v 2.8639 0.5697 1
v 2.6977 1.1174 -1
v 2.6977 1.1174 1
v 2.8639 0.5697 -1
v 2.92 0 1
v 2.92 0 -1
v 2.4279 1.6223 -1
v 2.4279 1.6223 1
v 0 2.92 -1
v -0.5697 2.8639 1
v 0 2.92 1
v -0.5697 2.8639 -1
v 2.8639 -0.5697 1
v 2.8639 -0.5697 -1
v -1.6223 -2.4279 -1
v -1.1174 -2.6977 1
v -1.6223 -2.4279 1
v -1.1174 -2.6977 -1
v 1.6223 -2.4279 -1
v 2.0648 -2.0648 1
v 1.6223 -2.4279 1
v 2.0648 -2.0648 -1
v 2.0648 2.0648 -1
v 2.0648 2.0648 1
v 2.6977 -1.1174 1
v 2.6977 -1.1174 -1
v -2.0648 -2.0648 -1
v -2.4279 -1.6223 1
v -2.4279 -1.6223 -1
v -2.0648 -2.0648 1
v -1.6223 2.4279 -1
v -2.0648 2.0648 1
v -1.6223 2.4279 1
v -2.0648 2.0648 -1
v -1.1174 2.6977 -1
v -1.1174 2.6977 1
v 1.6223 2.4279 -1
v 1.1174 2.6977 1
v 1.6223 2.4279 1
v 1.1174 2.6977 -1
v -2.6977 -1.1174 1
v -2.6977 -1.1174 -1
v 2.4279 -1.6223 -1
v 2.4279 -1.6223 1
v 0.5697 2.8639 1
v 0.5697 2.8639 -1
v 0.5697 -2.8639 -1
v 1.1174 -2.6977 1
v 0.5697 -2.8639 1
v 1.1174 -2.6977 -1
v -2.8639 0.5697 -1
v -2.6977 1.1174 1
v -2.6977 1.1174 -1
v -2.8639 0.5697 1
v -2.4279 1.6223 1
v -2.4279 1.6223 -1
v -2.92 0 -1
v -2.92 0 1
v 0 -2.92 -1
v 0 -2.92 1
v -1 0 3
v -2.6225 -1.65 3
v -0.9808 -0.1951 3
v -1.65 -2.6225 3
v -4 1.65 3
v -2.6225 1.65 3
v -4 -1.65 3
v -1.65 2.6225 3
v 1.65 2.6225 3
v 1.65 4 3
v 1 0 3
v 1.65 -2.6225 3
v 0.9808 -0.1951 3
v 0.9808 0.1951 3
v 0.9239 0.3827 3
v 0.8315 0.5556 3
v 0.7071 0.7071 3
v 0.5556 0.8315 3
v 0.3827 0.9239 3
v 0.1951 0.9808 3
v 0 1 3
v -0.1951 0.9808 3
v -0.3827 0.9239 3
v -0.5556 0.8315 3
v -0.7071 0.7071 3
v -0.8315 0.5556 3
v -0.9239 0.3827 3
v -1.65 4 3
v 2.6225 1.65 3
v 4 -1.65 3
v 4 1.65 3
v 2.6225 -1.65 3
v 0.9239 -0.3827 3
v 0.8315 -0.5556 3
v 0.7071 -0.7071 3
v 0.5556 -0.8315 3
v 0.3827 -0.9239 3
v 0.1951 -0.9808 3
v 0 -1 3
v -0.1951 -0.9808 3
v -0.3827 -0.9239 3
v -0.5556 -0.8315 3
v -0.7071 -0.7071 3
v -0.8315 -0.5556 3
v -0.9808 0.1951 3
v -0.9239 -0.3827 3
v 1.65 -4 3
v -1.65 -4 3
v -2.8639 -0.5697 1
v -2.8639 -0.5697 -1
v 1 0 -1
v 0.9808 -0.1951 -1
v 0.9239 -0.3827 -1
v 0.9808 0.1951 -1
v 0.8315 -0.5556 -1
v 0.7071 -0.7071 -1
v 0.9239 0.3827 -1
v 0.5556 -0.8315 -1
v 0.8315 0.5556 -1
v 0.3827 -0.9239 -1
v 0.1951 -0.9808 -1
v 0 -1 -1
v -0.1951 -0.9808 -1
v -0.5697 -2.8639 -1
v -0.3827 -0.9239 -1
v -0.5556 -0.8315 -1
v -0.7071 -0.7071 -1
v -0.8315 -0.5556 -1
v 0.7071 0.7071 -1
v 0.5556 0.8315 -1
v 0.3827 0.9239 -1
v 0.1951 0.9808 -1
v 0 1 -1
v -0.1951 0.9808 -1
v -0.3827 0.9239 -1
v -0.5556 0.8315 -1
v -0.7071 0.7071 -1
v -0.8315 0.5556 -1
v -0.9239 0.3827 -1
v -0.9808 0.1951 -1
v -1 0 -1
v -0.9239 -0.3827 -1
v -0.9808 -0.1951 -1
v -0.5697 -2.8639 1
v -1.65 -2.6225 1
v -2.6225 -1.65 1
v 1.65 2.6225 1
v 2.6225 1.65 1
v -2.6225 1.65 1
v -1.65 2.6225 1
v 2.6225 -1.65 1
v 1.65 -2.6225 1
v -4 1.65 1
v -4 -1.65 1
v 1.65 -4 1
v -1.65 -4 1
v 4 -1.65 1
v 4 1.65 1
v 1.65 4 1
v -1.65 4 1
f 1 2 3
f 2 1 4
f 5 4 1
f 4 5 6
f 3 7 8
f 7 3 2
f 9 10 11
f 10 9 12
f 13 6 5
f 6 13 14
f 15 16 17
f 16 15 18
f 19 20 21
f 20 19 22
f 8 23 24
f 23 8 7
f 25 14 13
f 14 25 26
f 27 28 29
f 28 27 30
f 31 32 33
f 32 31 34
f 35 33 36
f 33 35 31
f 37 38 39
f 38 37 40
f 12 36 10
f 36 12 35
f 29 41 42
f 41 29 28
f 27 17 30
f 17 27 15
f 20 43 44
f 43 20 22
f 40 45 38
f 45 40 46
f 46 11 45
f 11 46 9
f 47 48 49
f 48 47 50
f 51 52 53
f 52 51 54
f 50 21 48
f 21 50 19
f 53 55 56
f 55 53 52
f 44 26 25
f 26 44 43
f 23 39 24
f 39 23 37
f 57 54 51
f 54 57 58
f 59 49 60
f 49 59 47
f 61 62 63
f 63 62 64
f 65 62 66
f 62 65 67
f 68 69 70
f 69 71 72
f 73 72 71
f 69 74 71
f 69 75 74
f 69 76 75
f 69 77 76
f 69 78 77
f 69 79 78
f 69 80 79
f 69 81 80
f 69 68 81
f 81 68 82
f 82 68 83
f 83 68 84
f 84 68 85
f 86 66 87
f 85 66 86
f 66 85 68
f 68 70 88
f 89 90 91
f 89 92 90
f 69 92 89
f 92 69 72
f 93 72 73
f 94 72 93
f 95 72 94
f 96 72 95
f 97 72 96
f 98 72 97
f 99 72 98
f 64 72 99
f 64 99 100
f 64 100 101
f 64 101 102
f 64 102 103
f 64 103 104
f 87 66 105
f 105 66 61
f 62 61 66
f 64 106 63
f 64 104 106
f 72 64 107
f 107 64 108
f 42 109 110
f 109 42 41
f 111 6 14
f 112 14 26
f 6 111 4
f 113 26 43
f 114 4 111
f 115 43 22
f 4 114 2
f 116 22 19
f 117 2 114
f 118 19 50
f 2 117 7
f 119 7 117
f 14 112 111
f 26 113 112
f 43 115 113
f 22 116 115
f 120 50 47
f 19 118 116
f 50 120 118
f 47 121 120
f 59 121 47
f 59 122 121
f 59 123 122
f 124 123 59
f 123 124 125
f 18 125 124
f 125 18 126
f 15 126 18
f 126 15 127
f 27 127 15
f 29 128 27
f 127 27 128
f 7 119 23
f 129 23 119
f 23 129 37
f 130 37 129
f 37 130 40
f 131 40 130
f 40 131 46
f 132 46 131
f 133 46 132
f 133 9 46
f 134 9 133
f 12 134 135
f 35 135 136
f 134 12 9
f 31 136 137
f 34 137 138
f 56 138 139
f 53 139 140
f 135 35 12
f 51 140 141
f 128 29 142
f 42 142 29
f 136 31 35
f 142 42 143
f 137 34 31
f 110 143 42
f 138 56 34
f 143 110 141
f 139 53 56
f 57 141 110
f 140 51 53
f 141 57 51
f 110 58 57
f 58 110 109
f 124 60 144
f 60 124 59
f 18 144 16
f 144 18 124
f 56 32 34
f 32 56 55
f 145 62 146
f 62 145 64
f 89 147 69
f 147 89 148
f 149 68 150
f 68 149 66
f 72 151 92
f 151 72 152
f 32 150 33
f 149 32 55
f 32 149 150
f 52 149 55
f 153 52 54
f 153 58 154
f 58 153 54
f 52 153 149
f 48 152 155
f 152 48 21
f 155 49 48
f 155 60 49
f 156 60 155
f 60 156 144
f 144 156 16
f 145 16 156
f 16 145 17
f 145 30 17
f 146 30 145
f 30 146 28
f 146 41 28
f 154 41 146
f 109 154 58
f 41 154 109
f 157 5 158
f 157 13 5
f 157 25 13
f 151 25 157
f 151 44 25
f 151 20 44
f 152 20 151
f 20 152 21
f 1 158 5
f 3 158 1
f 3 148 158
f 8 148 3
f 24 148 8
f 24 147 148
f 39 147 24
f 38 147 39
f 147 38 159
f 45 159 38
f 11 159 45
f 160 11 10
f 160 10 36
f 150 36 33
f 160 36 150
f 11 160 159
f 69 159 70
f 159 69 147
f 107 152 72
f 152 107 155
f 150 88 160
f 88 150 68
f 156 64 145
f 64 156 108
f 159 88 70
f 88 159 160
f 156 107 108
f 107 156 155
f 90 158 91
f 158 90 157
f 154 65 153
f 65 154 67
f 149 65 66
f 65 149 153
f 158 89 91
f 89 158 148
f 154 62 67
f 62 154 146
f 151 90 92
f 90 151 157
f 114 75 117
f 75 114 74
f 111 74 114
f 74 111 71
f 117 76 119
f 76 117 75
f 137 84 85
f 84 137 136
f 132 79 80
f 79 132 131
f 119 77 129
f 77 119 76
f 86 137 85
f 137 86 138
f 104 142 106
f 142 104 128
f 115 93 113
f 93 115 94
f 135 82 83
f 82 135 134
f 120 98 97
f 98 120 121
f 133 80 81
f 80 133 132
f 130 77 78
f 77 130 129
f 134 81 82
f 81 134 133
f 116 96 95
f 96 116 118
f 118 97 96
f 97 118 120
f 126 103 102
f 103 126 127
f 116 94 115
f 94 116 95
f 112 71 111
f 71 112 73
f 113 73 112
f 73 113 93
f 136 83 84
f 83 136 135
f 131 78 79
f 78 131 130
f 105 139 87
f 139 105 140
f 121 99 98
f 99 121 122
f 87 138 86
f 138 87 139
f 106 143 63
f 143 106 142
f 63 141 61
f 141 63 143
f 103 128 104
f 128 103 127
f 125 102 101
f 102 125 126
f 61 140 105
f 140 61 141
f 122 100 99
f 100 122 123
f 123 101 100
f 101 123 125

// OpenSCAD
difference(){

    union(){

        translate([0, 0, -1]) 
        cylinder(d=5.84, h=4, $fn=32);
        
        translate([0, 0, 1]) 
        rotate([0, 0, 22.5])
        cylinder(d=6.54, h=2, $fn=8);
        
        //rotate([0,0,10])    
        translate([0-3.3/2, 0-8/2, 1])
        //rotate([0,0,10])
        cube([3.3, 8, 2]);
        
        translate([0-8/2, 0-3.3/2, 1])
        cube([8, 3.3, 2]);
        
    }
    
    translate([0, 0, -1]) 
    cylinder(d=2, h=5, $fn=32);
    
}
